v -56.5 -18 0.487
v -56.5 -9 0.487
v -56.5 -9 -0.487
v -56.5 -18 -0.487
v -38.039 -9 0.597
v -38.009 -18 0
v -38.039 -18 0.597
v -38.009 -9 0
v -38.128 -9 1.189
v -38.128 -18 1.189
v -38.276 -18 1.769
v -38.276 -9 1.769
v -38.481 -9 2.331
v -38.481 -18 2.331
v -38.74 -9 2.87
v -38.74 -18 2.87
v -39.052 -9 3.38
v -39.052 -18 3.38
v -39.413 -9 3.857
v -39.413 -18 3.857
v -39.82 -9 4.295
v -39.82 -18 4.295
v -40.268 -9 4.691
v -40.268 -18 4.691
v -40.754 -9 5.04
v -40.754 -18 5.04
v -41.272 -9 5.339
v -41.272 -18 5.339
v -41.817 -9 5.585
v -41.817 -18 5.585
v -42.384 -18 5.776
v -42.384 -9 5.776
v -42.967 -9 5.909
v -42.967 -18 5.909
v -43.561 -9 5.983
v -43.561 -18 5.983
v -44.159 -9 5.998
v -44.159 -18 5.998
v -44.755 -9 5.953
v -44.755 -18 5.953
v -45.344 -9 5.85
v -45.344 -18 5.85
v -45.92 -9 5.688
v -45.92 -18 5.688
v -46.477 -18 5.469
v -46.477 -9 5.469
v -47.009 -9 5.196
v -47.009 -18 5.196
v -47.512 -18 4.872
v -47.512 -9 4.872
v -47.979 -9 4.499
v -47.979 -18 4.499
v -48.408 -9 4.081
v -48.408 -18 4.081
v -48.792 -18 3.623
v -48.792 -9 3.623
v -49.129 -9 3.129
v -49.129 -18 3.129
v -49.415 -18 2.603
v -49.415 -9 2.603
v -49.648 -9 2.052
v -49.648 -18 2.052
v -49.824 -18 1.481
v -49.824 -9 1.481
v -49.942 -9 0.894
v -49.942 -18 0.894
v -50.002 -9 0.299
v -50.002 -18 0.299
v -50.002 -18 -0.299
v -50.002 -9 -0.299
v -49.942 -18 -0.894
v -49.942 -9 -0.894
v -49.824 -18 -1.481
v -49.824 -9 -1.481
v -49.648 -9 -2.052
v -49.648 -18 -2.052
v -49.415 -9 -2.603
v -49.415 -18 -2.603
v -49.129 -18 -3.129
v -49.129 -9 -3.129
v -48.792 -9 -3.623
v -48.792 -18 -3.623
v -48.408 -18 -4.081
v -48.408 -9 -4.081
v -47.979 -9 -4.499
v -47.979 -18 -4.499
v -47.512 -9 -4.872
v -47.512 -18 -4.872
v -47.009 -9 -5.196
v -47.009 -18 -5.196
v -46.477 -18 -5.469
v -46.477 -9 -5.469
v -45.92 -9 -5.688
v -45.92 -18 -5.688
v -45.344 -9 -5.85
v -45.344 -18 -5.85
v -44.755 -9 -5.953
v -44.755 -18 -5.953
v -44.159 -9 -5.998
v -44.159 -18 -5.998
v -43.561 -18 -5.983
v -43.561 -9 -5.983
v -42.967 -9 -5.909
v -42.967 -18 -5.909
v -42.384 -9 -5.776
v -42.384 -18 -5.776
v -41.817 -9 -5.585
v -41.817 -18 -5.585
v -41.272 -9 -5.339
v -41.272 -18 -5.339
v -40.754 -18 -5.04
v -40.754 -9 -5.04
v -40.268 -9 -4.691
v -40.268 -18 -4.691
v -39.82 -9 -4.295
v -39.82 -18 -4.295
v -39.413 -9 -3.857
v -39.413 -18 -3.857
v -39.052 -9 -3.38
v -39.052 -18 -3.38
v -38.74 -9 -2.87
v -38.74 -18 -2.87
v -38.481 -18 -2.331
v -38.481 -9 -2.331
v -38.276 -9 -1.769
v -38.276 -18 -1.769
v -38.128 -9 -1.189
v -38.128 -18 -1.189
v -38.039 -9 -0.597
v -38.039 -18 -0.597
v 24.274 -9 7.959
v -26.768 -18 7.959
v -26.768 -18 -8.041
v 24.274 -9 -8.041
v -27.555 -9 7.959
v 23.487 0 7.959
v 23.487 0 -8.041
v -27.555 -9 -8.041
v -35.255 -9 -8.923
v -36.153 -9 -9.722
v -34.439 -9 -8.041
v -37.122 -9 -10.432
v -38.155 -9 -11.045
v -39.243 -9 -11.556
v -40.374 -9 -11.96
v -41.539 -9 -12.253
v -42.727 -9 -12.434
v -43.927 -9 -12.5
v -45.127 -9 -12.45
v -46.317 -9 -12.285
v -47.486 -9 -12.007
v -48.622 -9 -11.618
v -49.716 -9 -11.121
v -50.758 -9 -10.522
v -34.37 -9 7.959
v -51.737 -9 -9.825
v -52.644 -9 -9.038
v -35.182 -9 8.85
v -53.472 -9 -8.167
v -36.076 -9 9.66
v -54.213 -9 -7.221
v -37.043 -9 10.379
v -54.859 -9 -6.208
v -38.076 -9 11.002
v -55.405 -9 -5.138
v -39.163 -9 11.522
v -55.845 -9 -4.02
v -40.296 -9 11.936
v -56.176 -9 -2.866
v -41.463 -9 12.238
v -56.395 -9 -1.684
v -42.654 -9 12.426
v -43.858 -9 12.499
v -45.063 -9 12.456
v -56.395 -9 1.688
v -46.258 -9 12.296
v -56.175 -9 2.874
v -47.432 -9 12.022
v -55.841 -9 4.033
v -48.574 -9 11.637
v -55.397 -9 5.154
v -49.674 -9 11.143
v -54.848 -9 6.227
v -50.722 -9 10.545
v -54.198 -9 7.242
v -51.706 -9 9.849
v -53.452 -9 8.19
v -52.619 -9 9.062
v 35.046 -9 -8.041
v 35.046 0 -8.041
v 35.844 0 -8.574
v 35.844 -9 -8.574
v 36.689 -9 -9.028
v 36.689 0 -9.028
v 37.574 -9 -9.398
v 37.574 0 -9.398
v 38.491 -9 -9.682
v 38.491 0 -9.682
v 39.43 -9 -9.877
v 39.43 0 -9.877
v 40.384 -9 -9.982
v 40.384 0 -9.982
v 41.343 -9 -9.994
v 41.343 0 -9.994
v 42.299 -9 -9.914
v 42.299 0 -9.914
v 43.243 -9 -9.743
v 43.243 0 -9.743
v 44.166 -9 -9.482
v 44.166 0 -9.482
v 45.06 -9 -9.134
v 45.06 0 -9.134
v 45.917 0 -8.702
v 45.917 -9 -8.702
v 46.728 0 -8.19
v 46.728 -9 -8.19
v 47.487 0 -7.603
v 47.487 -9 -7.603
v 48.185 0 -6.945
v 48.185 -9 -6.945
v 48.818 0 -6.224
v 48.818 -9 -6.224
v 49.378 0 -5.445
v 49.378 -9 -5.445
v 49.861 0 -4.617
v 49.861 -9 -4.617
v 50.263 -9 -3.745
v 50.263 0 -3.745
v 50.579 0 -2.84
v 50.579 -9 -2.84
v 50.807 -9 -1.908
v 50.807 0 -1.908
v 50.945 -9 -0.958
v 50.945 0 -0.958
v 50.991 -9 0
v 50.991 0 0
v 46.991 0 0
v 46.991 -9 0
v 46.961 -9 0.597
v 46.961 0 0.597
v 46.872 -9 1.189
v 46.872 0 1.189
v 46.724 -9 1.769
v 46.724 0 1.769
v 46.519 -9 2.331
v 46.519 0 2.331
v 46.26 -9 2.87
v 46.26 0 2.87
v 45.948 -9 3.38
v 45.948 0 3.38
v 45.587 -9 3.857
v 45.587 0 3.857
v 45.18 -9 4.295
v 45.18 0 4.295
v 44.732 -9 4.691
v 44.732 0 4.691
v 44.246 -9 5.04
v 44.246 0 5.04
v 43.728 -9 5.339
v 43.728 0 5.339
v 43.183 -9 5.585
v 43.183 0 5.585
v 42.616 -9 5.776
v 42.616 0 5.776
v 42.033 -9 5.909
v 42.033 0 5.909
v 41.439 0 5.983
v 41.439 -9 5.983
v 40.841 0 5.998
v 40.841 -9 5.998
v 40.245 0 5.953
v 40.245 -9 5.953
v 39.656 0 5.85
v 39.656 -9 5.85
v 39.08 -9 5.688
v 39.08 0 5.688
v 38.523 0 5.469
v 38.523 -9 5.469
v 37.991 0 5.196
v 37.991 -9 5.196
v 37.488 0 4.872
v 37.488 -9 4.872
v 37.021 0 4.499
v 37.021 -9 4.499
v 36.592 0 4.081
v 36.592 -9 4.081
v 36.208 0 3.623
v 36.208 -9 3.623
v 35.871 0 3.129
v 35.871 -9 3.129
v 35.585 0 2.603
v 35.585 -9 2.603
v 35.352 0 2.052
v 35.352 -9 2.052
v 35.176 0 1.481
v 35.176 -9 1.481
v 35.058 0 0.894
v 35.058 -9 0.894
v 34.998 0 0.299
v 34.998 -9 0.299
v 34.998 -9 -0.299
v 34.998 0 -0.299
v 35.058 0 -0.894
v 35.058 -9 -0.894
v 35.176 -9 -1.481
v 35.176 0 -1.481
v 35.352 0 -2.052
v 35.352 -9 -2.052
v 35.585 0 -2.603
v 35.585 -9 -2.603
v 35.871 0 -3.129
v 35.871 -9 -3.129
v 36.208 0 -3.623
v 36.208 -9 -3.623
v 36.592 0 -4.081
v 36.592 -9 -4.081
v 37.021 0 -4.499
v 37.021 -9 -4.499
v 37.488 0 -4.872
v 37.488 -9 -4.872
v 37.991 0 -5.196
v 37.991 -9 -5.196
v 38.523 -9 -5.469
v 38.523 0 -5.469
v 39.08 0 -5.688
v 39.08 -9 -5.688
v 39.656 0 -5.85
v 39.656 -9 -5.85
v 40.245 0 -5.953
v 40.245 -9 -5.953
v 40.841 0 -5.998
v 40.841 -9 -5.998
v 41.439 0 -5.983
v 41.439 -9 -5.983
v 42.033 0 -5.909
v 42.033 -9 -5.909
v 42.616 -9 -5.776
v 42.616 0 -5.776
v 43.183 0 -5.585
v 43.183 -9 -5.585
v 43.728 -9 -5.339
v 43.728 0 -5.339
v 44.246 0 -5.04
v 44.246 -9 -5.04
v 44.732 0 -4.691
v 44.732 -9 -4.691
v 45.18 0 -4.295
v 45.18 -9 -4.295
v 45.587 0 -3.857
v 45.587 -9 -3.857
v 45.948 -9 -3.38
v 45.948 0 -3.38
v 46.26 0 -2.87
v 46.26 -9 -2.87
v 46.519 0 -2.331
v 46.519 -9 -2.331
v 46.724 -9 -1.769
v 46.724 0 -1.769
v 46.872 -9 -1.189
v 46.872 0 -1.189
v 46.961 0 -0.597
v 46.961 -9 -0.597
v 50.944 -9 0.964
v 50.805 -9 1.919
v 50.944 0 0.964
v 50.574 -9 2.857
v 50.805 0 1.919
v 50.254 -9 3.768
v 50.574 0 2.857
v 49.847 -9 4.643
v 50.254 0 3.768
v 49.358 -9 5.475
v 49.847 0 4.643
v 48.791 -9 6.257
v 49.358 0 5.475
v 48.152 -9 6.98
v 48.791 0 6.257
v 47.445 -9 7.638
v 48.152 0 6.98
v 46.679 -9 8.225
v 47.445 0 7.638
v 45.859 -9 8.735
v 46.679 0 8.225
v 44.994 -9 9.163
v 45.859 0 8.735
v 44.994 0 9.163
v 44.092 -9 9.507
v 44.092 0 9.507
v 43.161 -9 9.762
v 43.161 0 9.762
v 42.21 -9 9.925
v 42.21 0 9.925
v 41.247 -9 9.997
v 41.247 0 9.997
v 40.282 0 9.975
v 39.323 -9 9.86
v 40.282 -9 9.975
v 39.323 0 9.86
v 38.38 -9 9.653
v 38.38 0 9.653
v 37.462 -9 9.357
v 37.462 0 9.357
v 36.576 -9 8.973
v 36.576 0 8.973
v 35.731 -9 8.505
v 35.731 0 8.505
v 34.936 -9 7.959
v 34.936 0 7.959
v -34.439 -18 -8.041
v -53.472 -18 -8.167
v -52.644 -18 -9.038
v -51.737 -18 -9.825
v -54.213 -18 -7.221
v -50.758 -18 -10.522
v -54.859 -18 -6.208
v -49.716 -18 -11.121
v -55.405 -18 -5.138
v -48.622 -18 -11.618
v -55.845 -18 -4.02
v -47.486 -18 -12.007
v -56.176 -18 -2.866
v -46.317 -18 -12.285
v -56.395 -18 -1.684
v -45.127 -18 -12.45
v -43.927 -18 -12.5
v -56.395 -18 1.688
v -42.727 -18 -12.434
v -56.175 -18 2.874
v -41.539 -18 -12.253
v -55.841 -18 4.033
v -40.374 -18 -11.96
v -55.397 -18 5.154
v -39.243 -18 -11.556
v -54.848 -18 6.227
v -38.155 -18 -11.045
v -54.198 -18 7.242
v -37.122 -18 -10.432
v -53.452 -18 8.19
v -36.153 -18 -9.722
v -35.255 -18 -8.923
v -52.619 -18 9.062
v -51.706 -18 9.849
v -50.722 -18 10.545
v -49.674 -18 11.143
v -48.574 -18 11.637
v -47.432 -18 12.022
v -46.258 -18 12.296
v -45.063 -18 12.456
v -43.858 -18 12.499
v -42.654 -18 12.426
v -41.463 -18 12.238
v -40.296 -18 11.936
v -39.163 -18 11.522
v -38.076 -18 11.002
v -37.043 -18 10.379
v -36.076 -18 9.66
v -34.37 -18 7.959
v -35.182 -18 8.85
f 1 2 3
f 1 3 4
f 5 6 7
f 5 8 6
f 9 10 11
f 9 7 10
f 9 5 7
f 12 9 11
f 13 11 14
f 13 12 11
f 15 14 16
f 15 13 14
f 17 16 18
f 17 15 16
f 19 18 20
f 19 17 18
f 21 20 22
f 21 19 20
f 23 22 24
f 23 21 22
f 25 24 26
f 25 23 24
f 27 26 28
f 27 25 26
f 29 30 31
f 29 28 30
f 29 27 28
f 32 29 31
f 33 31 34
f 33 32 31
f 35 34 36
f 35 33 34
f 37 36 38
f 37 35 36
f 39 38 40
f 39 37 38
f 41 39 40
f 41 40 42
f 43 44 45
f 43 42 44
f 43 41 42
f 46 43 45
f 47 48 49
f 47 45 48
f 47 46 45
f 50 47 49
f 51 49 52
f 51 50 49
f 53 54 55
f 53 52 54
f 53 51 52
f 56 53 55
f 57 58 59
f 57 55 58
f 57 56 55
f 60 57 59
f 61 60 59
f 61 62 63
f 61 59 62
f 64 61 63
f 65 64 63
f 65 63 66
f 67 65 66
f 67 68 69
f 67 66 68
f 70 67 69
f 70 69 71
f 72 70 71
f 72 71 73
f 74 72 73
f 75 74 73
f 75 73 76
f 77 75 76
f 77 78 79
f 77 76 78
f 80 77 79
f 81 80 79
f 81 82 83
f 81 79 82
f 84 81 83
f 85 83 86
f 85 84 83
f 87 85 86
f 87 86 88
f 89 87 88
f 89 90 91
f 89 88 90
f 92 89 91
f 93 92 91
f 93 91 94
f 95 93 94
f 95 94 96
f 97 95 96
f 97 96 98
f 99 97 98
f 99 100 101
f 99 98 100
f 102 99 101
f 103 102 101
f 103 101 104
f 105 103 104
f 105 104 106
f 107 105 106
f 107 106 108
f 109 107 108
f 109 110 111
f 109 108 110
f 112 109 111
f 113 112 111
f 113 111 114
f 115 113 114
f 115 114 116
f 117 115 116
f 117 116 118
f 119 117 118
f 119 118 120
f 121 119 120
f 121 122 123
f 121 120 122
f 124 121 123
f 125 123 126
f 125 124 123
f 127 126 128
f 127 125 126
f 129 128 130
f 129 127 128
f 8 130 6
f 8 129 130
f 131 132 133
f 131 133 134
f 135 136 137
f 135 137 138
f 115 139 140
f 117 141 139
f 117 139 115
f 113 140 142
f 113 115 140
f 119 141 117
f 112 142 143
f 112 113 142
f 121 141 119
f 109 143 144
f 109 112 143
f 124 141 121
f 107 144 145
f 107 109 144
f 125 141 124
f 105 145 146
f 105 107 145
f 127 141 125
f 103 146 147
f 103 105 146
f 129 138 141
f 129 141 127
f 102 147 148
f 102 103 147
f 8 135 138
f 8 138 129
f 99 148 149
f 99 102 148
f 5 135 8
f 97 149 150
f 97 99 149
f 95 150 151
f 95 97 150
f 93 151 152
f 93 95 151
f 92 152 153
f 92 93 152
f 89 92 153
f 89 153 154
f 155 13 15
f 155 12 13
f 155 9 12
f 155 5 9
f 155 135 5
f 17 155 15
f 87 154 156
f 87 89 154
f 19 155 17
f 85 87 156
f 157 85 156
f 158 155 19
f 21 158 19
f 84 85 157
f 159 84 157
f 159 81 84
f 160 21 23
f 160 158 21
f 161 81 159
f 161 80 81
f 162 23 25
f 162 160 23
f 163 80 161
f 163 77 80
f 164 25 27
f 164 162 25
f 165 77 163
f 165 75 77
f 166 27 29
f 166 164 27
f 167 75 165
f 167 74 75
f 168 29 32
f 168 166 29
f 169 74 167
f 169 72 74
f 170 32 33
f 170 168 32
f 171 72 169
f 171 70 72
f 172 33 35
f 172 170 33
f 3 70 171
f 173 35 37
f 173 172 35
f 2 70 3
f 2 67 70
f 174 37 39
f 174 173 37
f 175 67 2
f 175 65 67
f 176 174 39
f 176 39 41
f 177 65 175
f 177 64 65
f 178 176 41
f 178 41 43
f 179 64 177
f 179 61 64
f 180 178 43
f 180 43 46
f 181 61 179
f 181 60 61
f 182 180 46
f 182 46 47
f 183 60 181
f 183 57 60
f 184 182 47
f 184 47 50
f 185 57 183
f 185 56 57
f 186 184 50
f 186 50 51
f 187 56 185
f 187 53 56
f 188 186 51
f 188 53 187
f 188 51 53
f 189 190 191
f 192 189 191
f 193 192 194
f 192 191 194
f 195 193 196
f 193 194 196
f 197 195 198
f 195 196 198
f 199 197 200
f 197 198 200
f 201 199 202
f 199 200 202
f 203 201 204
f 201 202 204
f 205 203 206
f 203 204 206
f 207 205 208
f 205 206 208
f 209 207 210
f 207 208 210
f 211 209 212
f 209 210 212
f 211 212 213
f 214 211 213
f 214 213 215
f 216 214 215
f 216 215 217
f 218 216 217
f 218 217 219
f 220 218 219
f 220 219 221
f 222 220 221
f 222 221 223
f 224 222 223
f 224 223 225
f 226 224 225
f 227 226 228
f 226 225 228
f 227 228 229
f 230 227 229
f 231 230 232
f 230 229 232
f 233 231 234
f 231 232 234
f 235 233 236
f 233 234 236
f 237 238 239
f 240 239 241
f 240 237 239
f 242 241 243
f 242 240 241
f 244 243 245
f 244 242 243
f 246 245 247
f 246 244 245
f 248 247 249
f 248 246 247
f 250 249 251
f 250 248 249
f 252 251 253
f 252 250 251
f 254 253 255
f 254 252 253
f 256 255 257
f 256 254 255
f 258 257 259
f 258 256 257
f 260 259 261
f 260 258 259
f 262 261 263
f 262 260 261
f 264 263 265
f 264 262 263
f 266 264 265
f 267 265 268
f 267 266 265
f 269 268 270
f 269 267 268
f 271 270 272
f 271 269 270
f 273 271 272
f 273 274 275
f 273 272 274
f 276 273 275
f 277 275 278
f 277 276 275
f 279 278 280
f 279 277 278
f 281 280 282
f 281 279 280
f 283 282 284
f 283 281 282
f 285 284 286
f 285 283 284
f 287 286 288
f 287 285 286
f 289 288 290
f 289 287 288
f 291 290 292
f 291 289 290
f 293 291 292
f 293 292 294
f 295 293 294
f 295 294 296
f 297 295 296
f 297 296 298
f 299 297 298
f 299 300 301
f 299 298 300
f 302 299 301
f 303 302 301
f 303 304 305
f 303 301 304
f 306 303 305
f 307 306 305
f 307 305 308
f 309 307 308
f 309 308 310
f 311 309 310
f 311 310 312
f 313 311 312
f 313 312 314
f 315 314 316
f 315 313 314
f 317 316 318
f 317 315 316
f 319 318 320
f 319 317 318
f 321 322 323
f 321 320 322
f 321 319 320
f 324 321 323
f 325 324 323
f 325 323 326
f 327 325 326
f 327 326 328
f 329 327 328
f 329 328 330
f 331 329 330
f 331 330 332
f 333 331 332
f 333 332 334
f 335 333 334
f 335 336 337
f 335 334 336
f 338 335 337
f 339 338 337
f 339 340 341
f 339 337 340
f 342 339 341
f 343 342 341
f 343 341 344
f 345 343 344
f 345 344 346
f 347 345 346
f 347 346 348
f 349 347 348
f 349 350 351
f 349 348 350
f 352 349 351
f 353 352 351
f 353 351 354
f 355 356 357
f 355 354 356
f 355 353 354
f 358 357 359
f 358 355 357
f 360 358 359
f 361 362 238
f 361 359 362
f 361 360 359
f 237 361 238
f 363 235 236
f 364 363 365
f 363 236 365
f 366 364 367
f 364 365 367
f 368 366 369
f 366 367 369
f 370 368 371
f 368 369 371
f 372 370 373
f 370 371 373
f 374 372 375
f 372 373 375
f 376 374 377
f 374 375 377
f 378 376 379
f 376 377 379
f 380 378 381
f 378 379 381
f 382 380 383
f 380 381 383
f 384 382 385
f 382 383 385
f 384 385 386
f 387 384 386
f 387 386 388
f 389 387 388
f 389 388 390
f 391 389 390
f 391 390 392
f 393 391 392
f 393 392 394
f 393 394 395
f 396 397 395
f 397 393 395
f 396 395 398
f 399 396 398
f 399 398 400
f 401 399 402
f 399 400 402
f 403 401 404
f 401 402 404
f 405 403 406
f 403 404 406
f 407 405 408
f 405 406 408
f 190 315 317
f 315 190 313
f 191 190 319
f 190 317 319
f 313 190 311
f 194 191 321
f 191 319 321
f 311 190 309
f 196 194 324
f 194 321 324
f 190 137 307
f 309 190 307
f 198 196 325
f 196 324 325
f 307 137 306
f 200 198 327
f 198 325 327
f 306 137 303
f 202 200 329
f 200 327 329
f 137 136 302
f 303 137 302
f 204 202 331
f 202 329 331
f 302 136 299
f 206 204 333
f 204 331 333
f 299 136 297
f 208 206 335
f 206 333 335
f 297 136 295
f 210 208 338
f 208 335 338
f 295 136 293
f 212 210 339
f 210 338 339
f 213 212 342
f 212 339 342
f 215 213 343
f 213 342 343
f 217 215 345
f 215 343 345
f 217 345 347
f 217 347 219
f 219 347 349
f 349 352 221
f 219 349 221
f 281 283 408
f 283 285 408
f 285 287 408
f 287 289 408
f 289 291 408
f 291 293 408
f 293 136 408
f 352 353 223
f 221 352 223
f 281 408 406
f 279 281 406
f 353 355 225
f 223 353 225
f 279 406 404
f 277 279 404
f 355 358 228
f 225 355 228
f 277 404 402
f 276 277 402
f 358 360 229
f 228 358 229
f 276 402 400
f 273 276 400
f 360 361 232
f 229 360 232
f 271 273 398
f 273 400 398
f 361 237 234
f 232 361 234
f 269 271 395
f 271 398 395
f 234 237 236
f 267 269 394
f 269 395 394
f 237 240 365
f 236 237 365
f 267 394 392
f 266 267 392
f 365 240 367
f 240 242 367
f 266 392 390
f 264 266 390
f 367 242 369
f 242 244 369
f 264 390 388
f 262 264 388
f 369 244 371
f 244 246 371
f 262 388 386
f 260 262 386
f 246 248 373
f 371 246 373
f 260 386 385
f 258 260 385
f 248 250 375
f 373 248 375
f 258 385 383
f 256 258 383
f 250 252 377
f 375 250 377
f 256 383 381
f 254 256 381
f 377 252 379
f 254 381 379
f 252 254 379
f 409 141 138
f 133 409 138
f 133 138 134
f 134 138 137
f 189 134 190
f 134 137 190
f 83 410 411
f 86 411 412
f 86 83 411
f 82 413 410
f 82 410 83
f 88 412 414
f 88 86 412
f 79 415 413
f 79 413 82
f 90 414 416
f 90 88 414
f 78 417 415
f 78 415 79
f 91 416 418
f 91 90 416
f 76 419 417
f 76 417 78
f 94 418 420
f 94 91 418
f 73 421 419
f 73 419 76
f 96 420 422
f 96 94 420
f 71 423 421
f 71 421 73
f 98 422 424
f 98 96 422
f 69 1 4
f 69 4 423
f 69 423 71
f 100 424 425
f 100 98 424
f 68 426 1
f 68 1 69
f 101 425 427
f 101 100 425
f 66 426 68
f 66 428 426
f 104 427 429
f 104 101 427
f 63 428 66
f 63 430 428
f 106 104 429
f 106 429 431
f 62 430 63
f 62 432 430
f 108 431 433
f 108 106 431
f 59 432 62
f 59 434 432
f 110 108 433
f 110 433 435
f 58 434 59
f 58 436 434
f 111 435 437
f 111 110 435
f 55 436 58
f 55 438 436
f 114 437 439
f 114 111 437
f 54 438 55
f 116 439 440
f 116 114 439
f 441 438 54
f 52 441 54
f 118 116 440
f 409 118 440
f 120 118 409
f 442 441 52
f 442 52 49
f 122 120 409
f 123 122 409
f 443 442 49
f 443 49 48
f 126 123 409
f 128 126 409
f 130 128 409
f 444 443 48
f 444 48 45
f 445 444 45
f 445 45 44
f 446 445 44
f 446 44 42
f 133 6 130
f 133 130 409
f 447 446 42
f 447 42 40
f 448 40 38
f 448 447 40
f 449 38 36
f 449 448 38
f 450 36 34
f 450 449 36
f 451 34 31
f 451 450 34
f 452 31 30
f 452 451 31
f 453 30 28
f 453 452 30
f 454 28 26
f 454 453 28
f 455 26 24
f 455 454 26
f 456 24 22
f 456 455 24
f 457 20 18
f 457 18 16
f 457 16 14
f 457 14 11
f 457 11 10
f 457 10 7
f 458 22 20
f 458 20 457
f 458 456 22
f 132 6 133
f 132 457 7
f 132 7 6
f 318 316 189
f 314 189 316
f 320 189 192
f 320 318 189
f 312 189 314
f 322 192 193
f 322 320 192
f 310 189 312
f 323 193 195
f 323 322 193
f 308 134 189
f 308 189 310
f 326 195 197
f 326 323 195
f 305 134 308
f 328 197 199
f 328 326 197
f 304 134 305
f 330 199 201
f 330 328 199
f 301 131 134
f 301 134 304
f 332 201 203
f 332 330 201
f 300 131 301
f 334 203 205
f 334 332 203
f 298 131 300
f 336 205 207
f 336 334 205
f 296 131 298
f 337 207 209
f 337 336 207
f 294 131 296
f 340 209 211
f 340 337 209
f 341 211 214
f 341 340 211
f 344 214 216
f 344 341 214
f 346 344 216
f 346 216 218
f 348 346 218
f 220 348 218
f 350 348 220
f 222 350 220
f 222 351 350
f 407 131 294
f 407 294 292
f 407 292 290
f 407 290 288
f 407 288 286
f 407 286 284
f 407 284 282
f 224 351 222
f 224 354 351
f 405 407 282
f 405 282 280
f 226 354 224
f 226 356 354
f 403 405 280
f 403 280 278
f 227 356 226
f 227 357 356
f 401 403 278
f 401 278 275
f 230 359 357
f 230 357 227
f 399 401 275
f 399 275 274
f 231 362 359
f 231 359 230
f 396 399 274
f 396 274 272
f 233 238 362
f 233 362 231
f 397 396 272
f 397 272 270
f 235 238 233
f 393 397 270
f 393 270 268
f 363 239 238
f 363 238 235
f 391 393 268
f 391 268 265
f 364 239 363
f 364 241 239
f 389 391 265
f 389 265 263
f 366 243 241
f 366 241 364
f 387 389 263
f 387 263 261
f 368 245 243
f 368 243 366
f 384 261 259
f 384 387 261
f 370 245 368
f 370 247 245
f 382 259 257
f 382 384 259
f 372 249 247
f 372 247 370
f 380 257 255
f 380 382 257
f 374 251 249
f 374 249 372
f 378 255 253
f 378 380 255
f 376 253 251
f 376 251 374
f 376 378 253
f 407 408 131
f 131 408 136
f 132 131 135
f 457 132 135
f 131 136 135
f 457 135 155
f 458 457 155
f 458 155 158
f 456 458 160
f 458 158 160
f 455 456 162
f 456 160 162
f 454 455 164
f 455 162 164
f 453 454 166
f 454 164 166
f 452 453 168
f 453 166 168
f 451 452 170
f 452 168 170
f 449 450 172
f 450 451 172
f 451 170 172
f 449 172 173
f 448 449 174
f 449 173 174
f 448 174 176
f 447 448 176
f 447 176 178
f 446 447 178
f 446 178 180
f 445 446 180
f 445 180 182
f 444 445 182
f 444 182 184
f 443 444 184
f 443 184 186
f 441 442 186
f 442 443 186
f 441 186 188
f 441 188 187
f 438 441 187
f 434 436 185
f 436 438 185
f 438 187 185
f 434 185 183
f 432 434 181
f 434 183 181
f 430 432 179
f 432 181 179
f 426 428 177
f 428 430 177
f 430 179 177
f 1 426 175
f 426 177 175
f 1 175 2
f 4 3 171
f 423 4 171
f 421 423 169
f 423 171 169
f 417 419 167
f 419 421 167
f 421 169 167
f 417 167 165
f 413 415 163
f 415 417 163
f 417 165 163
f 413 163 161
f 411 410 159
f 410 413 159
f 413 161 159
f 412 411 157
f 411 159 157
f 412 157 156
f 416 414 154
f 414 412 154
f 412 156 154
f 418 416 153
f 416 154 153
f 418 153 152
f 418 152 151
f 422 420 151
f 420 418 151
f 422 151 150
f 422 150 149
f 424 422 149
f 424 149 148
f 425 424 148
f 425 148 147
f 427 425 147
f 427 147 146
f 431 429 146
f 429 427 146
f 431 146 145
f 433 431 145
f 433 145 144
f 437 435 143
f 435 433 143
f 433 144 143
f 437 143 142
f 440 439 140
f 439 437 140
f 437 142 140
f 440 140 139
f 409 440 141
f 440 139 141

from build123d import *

# Parameters (mm, degrees)
F0_R     = 6
F1_DEPTH = 25
F3_DEPTH = 12.5


with BuildPart() as f1:
    # F0 (on Front) → F1 (new body)
    with BuildSketch(Plane.XZ):
        with BuildLine():
            ThreePointArc((-34.439272, -8.041347), (-32.264663, -4.27924), (-31.509368, 0))
            ThreePointArc((-31.509368, 0), (-32.24635, 4.228641), (-34.370393, 7.958653))
            ThreePointArc((-34.370393, 7.958653), (-56.509252, 0.053811), (-34.439272, -8.041347))
        make_face()
        with Locations((-44.009368, 0)):
            Circle(F0_R, mode=Mode.SUBTRACT)
        with BuildLine():
            ThreePointArc((-34.370393, 7.958653), (-32.24635, 4.228641), (-31.509368, 0))
            ThreePointArc((-31.509368, 0), (-32.264663, -4.27924), (-34.439272, -8.041347))
            Line((-34.439272, -8.041347), (35.046161, -8.041347))
            ThreePointArc((35.046161, -8.041347), (30.99087, -0.068914), (34.935895, 7.958653))
            Line((34.935895, 7.958653), (-34.370393, 7.958653))
        make_face()
        with BuildLine():
            ThreePointArc((50.990632, 0), (45.432064, 8.959558), (34.935895, 7.958653))
            ThreePointArc((34.935895, 7.958653), (30.99087, -0.068914), (35.046161, -8.041347))
            ThreePointArc((35.046161, -8.041347), (45.493703, -8.928738), (50.990632, 0))
        make_face()
        with Locations((40.990632, 0)):
            Circle(F0_R, mode=Mode.SUBTRACT)
    extrude(amount=F1_DEPTH)

    # F2 (on Top) → F3 (intersect, symmetric)
    with BuildSketch(Plane.XY):
        Polygon((-27.554982, -9), (-56.499865, -9), (-56.499865, -18), (-26.767584, -18), (24.273953, -9), (51.126346, -9), (51.126346, 0), (23.486555, 0), align=None)
    extrude(amount=F3_DEPTH, both=True, mode=Mode.INTERSECT)


solid = f1.part
